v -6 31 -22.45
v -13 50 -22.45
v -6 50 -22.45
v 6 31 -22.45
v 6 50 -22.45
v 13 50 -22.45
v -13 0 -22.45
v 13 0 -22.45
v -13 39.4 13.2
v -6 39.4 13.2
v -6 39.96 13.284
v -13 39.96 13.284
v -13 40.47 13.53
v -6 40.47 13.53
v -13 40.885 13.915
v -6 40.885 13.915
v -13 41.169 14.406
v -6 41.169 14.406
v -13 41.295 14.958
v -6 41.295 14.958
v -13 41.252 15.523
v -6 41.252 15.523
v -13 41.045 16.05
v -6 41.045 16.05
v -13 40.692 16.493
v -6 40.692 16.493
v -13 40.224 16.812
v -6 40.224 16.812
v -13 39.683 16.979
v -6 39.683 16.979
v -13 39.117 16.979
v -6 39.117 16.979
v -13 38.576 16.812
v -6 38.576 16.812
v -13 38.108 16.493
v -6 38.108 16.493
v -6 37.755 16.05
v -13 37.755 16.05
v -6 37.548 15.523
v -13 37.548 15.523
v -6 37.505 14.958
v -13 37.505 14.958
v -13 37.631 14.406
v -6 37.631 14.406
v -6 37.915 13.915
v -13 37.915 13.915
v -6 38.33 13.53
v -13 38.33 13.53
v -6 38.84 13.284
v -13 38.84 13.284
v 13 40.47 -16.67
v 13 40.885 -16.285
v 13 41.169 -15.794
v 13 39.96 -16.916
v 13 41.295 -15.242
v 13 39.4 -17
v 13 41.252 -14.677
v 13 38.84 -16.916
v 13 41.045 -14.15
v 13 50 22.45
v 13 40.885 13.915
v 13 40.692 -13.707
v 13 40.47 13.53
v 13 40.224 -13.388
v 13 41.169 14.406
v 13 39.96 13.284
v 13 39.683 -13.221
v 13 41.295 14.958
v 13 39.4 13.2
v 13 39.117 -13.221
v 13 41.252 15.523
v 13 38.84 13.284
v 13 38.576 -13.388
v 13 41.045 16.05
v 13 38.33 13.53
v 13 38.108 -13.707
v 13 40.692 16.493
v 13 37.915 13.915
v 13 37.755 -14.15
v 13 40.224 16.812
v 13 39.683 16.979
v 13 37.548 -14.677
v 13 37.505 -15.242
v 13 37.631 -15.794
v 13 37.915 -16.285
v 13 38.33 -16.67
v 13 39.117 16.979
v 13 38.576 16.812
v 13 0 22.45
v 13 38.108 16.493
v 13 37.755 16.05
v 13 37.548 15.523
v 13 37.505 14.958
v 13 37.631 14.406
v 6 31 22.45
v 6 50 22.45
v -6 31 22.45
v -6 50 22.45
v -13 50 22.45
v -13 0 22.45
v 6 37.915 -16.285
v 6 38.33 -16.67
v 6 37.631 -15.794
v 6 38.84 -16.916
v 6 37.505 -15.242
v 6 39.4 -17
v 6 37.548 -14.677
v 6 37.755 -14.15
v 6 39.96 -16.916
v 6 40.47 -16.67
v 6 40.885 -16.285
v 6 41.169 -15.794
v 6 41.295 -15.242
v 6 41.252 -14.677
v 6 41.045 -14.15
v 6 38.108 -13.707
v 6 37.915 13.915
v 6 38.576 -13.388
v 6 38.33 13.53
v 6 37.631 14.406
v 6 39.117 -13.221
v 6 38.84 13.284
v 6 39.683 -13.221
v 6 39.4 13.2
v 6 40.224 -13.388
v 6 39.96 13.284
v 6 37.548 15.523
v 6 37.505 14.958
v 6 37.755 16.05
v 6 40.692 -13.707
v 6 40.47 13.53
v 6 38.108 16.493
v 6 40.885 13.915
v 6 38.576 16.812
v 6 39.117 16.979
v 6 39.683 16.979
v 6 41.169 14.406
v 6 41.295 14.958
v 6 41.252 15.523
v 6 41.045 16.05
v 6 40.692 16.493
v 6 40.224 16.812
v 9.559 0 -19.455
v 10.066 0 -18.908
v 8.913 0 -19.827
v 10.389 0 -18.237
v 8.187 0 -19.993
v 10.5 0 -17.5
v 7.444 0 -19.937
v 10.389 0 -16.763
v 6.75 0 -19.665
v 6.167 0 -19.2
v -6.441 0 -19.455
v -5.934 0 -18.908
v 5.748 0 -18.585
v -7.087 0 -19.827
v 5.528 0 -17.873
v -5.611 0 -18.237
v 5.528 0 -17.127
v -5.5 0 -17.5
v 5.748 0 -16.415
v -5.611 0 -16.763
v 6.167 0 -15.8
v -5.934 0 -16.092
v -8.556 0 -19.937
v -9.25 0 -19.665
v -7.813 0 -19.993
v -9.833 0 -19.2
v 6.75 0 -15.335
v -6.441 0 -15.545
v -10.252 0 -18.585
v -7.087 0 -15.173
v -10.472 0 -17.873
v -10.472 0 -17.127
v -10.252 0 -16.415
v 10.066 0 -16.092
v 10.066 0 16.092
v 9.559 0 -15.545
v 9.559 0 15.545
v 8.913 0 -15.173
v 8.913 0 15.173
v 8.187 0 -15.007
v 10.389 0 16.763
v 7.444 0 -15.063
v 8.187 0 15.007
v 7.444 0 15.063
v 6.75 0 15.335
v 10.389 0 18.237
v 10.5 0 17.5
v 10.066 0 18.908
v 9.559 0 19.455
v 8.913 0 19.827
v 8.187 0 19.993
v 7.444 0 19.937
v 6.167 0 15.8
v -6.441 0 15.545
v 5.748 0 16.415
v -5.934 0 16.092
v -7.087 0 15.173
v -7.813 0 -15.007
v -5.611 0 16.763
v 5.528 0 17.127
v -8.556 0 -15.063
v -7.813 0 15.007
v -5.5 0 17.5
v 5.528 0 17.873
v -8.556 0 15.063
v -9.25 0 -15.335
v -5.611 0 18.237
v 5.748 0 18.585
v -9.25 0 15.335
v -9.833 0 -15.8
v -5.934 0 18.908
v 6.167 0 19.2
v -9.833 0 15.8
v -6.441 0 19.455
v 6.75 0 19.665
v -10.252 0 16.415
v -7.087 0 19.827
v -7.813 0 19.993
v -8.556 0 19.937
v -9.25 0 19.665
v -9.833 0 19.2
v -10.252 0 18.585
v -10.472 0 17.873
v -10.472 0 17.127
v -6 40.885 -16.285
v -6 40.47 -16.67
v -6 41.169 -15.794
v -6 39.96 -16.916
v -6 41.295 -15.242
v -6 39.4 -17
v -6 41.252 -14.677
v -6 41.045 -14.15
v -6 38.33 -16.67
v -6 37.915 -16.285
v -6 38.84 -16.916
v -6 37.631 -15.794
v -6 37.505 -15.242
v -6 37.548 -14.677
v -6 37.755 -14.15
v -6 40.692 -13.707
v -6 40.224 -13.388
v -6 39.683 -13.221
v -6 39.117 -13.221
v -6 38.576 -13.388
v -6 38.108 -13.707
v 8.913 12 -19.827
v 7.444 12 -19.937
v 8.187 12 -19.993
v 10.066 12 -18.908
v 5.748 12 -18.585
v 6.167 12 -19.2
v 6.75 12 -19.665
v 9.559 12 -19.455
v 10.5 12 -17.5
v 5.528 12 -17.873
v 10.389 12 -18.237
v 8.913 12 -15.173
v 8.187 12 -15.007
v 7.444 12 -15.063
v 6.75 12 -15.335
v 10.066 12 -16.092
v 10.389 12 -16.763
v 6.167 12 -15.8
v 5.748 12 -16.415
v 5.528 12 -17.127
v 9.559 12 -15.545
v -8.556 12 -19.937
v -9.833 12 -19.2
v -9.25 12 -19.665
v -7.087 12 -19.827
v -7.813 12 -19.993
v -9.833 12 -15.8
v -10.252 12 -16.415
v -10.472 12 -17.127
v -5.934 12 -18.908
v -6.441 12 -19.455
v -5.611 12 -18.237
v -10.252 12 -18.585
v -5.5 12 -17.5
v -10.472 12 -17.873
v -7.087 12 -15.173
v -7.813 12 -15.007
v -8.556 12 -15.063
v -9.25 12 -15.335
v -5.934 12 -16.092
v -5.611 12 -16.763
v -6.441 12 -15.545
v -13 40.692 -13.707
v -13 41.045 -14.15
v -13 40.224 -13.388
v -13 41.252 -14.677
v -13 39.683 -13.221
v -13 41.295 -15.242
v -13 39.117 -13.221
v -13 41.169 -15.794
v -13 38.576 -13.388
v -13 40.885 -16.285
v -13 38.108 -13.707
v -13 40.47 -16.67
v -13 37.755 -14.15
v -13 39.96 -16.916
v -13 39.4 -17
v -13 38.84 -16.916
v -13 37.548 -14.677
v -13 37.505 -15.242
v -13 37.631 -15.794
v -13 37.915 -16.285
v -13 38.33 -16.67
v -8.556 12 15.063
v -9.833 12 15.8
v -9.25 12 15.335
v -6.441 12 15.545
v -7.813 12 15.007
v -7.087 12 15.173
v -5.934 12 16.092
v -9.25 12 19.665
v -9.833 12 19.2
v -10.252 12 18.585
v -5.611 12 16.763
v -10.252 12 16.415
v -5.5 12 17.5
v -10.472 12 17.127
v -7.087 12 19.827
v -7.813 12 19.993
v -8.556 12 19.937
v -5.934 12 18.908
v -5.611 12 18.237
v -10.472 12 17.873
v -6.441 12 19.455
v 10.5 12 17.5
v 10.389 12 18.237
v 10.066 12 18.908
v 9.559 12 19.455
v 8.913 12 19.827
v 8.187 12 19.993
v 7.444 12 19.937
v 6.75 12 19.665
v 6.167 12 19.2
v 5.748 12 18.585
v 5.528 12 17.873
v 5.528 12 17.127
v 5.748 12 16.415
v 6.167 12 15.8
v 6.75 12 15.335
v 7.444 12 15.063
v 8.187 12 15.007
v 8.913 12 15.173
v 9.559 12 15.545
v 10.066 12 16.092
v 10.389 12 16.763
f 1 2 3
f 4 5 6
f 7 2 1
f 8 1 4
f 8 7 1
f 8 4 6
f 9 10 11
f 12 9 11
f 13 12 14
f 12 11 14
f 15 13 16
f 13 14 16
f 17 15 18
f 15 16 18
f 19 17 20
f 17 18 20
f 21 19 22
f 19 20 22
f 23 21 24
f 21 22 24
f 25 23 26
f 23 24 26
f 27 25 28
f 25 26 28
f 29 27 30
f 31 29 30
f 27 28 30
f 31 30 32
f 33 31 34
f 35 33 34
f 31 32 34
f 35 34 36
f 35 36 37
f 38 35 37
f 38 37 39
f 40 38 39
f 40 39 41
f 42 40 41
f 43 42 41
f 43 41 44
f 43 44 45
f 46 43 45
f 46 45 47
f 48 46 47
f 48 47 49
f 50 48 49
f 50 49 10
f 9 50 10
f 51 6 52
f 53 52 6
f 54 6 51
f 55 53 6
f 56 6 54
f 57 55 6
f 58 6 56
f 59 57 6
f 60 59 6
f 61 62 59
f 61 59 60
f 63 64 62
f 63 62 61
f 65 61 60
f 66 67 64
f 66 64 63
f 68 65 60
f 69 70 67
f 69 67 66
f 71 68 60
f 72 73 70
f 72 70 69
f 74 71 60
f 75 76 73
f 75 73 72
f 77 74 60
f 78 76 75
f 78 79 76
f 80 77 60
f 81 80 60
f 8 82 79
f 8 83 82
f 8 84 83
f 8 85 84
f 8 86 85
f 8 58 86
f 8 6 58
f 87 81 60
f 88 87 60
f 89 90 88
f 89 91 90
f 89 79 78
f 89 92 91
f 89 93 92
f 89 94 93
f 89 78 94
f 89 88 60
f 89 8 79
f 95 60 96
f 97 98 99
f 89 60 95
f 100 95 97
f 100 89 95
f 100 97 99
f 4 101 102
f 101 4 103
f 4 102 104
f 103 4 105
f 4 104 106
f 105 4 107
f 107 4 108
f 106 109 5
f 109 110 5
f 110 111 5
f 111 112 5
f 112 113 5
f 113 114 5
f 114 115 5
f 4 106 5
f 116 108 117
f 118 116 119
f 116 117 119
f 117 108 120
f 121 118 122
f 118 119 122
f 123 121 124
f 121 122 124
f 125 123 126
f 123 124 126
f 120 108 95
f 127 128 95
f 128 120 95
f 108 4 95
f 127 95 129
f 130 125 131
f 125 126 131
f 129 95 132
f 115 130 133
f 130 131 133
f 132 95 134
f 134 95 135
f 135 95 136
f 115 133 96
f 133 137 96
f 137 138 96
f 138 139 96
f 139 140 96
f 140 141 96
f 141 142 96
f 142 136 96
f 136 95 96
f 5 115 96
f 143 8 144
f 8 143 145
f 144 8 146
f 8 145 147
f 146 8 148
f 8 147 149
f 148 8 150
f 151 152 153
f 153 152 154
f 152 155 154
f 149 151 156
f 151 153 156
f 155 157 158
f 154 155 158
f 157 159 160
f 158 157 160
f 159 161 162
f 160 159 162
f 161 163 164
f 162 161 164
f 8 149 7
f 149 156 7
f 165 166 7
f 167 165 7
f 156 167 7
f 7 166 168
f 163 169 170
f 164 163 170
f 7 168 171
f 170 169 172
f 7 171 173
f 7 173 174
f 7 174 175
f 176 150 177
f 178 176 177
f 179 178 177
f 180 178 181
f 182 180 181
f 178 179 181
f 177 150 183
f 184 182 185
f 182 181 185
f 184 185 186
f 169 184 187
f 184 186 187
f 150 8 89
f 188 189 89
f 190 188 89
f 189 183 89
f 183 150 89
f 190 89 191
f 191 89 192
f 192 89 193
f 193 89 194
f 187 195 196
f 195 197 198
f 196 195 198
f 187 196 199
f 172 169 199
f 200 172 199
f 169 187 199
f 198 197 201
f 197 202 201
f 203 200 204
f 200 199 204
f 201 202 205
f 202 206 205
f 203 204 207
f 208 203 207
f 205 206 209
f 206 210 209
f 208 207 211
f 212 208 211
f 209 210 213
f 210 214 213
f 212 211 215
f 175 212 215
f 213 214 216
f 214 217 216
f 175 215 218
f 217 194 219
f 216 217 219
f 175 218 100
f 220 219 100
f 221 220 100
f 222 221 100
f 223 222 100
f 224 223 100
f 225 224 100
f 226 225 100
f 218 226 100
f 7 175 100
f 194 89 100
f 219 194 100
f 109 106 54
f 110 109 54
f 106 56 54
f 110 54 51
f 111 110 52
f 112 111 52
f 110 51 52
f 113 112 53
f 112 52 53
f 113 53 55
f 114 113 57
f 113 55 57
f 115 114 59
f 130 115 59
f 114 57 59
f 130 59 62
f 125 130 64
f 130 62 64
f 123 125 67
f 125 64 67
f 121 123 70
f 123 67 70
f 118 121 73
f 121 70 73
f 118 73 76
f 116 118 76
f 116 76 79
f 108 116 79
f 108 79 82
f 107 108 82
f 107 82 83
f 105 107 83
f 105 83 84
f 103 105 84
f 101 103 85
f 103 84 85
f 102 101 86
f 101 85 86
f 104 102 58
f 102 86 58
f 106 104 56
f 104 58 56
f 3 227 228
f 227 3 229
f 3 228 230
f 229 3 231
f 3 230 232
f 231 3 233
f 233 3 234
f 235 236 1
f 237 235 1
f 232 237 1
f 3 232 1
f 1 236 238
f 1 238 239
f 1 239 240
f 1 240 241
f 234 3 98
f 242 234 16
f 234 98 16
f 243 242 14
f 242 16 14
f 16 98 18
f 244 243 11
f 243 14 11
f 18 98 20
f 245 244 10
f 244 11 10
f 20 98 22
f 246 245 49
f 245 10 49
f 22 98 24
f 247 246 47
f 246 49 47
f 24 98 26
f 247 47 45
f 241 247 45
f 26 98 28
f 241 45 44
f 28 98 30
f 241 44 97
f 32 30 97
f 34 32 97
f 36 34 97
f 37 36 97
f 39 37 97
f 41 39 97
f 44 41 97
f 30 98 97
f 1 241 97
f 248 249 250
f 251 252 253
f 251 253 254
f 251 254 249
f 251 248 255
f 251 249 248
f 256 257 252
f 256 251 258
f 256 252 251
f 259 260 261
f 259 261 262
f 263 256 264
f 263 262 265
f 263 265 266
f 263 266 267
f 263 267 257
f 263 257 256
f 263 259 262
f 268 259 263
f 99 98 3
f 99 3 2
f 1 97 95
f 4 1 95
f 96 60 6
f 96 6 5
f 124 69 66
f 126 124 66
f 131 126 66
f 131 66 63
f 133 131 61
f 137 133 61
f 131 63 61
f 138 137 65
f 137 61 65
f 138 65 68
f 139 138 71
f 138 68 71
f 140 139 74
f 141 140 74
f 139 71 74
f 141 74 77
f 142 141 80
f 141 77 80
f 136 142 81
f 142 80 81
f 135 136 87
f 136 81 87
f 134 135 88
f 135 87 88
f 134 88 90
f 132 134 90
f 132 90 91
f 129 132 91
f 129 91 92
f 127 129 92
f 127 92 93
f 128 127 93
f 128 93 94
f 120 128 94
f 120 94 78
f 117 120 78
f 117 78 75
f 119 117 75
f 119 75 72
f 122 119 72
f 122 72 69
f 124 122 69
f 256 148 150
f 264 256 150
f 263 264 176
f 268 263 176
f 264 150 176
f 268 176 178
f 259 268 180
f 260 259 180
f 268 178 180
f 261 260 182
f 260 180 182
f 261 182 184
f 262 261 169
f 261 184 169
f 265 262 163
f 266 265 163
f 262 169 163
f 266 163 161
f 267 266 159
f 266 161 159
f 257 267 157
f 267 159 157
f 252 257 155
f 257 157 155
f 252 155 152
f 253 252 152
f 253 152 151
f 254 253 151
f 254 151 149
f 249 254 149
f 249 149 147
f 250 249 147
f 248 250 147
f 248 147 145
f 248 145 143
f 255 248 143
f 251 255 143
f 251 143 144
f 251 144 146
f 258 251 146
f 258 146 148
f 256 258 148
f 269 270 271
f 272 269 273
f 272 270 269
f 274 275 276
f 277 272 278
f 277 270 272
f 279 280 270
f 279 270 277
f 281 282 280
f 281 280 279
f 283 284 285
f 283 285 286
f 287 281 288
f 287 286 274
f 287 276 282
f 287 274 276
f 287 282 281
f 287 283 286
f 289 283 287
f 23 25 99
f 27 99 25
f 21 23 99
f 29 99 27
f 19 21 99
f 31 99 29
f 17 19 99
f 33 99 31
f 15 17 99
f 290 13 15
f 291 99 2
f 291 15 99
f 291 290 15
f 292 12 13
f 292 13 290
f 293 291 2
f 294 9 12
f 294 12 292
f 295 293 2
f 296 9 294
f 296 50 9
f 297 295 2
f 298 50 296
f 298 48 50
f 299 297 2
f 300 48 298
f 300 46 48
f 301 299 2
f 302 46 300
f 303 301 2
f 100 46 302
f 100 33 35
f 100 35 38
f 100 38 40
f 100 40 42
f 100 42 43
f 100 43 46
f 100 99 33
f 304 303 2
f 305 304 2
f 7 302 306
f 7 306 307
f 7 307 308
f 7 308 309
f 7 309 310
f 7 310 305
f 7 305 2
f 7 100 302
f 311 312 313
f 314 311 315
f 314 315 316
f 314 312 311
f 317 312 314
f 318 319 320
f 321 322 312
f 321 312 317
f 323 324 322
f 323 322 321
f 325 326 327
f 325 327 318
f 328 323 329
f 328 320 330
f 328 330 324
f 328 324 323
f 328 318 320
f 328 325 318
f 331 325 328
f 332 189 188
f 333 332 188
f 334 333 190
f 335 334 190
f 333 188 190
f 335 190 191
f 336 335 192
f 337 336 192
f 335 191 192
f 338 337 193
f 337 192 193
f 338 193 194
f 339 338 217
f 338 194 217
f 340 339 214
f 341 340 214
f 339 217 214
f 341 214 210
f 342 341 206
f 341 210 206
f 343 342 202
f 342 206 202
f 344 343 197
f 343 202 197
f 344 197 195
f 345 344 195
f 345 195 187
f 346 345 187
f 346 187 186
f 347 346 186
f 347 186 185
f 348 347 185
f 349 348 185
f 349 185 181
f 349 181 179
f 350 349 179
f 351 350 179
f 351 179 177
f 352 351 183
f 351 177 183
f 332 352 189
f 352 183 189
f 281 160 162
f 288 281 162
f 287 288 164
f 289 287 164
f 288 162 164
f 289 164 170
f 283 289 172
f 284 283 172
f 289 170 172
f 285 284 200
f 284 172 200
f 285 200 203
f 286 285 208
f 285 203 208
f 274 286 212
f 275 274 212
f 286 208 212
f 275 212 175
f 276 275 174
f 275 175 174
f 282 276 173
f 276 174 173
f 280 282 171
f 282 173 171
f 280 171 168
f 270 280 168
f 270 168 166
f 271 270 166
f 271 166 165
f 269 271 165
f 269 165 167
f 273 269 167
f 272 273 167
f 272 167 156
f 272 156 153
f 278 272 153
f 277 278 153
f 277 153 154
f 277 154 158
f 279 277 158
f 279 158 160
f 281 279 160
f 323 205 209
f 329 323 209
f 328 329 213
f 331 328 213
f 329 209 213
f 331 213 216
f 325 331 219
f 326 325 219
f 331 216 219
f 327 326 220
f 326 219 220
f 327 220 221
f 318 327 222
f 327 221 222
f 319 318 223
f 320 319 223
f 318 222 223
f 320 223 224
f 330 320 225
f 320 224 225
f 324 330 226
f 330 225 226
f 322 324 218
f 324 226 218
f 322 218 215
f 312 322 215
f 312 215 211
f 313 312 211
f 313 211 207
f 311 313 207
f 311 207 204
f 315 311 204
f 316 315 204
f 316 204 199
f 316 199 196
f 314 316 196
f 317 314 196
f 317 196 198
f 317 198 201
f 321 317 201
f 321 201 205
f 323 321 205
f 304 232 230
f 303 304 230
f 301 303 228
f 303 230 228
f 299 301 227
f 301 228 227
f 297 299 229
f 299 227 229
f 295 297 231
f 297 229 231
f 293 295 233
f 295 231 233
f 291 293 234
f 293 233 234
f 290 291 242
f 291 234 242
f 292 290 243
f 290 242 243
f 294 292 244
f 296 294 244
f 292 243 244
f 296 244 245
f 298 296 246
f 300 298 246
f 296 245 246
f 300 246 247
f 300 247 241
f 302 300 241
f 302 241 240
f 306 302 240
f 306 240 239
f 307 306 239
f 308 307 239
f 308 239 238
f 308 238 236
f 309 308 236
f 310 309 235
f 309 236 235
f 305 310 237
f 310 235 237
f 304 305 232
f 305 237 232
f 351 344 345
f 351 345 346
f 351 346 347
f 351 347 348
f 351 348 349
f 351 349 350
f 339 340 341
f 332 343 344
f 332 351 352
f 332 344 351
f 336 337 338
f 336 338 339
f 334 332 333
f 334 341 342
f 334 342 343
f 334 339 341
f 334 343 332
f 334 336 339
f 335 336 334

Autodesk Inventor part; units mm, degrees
ref_plane "YZ Plane" through (0, 0, 0) normal (1, 0, 0) x (0, 1, 0)
ref_plane "XZ Plane" through (0, 0, 0) normal (0, 1, 0) x (-1, 0, 0)
ref_plane "XY Plane" through (0, 0, 0) normal (0, 0, 1) x (1, 0, 0)
sketch "Sketch1" plane through (0, 0, 0) normal (0, 1, 0) x (-1, 0, 0)
  line L0 (-13, 22.45) -> (13, 22.45)
  line L1 (13, 22.45) -> (13, -22.45)
  line L2 (13, -22.45) -> (-13, -22.45)
  line L3 (-13, -22.45) -> (-13, 22.45)
  line L4 (-13, 22.45) -> (13, -22.45) construction
  line L5 (13, 22.45) -> (-13, -22.45) construction
  point P0 (0, 0)
  dimension "d0" = 26
  dimension "d1" = 44.9
extrude "Extrusion1" add sketch "Sketch1" along normal blind 50
sketch "Sketch2" plane through (-13, 0, 22.45) normal (0, 0, 1) x (1, 0, 0)
  line L0 (0, 0) -> (26, 0) projected
  line L1 (26, 0) -> (26, 50) projected
  line L2 (0, 50) -> (26, 50) projected
  line L3 (0, 0) -> (0, 50) projected
  line L4 (13, 50) -> (13, 0)
  line L5 (13, 50) -> (7, 50)
  line L6 (26, 50) -> (0, 50) projected
  line L7 (7, 50) -> (7, 31)
  line L8 (7, 31) -> (19, 31)
  line L9 (19, 31) -> (19, 50)
  line L10 (13, 50) -> (19, 50)
  dimension "d4" = 6
  dimension "d5" = 19
  dimension "d6" = 12
extrude "Extrusion2" cut sketch "Sketch2" against normal blind 50 contours L8 L7 L2 L4 | L4 L2 L9 L8
sketch "Sketch3" plane through (13, 0, 22.45) normal (1, 0, 0) x (0, 0, -1)
  circle A0 centre (7.35, 39.4) radius 1.9
  circle A1 centre (37.55, 39.4) radius 1.9
  line L0 (0, 50) -> (44.9, 50) projected
  line L1 (22.45, 50) -> (22.45, 0)
  line L2 (44.9, 0) -> (0, 0) projected
  point P0 (22.45, 25)
  point P1 (3.8014, 50)
  dimension "d9" = 3.8
extrude "Extrusion3" cut sketch "Sketch3" against normal blind 50
sketch "Sketch4" plane through (0, 0, 0) normal (0, -1, 0) x (1, 0, 0)
  circle A0 centre (-8, -17.5) radius 2.5 projected
  circle A1 centre (8, -17.5) radius 2.5 projected
  circle A2 centre (-8, 17.5) radius 2.5 projected
  circle A3 centre (8, 17.5) radius 2.5 projected
  point P0 (0, 0)
extrude "Extrusion4" cut sketch "Sketch4" against normal blind 12
properties part number "housing"
